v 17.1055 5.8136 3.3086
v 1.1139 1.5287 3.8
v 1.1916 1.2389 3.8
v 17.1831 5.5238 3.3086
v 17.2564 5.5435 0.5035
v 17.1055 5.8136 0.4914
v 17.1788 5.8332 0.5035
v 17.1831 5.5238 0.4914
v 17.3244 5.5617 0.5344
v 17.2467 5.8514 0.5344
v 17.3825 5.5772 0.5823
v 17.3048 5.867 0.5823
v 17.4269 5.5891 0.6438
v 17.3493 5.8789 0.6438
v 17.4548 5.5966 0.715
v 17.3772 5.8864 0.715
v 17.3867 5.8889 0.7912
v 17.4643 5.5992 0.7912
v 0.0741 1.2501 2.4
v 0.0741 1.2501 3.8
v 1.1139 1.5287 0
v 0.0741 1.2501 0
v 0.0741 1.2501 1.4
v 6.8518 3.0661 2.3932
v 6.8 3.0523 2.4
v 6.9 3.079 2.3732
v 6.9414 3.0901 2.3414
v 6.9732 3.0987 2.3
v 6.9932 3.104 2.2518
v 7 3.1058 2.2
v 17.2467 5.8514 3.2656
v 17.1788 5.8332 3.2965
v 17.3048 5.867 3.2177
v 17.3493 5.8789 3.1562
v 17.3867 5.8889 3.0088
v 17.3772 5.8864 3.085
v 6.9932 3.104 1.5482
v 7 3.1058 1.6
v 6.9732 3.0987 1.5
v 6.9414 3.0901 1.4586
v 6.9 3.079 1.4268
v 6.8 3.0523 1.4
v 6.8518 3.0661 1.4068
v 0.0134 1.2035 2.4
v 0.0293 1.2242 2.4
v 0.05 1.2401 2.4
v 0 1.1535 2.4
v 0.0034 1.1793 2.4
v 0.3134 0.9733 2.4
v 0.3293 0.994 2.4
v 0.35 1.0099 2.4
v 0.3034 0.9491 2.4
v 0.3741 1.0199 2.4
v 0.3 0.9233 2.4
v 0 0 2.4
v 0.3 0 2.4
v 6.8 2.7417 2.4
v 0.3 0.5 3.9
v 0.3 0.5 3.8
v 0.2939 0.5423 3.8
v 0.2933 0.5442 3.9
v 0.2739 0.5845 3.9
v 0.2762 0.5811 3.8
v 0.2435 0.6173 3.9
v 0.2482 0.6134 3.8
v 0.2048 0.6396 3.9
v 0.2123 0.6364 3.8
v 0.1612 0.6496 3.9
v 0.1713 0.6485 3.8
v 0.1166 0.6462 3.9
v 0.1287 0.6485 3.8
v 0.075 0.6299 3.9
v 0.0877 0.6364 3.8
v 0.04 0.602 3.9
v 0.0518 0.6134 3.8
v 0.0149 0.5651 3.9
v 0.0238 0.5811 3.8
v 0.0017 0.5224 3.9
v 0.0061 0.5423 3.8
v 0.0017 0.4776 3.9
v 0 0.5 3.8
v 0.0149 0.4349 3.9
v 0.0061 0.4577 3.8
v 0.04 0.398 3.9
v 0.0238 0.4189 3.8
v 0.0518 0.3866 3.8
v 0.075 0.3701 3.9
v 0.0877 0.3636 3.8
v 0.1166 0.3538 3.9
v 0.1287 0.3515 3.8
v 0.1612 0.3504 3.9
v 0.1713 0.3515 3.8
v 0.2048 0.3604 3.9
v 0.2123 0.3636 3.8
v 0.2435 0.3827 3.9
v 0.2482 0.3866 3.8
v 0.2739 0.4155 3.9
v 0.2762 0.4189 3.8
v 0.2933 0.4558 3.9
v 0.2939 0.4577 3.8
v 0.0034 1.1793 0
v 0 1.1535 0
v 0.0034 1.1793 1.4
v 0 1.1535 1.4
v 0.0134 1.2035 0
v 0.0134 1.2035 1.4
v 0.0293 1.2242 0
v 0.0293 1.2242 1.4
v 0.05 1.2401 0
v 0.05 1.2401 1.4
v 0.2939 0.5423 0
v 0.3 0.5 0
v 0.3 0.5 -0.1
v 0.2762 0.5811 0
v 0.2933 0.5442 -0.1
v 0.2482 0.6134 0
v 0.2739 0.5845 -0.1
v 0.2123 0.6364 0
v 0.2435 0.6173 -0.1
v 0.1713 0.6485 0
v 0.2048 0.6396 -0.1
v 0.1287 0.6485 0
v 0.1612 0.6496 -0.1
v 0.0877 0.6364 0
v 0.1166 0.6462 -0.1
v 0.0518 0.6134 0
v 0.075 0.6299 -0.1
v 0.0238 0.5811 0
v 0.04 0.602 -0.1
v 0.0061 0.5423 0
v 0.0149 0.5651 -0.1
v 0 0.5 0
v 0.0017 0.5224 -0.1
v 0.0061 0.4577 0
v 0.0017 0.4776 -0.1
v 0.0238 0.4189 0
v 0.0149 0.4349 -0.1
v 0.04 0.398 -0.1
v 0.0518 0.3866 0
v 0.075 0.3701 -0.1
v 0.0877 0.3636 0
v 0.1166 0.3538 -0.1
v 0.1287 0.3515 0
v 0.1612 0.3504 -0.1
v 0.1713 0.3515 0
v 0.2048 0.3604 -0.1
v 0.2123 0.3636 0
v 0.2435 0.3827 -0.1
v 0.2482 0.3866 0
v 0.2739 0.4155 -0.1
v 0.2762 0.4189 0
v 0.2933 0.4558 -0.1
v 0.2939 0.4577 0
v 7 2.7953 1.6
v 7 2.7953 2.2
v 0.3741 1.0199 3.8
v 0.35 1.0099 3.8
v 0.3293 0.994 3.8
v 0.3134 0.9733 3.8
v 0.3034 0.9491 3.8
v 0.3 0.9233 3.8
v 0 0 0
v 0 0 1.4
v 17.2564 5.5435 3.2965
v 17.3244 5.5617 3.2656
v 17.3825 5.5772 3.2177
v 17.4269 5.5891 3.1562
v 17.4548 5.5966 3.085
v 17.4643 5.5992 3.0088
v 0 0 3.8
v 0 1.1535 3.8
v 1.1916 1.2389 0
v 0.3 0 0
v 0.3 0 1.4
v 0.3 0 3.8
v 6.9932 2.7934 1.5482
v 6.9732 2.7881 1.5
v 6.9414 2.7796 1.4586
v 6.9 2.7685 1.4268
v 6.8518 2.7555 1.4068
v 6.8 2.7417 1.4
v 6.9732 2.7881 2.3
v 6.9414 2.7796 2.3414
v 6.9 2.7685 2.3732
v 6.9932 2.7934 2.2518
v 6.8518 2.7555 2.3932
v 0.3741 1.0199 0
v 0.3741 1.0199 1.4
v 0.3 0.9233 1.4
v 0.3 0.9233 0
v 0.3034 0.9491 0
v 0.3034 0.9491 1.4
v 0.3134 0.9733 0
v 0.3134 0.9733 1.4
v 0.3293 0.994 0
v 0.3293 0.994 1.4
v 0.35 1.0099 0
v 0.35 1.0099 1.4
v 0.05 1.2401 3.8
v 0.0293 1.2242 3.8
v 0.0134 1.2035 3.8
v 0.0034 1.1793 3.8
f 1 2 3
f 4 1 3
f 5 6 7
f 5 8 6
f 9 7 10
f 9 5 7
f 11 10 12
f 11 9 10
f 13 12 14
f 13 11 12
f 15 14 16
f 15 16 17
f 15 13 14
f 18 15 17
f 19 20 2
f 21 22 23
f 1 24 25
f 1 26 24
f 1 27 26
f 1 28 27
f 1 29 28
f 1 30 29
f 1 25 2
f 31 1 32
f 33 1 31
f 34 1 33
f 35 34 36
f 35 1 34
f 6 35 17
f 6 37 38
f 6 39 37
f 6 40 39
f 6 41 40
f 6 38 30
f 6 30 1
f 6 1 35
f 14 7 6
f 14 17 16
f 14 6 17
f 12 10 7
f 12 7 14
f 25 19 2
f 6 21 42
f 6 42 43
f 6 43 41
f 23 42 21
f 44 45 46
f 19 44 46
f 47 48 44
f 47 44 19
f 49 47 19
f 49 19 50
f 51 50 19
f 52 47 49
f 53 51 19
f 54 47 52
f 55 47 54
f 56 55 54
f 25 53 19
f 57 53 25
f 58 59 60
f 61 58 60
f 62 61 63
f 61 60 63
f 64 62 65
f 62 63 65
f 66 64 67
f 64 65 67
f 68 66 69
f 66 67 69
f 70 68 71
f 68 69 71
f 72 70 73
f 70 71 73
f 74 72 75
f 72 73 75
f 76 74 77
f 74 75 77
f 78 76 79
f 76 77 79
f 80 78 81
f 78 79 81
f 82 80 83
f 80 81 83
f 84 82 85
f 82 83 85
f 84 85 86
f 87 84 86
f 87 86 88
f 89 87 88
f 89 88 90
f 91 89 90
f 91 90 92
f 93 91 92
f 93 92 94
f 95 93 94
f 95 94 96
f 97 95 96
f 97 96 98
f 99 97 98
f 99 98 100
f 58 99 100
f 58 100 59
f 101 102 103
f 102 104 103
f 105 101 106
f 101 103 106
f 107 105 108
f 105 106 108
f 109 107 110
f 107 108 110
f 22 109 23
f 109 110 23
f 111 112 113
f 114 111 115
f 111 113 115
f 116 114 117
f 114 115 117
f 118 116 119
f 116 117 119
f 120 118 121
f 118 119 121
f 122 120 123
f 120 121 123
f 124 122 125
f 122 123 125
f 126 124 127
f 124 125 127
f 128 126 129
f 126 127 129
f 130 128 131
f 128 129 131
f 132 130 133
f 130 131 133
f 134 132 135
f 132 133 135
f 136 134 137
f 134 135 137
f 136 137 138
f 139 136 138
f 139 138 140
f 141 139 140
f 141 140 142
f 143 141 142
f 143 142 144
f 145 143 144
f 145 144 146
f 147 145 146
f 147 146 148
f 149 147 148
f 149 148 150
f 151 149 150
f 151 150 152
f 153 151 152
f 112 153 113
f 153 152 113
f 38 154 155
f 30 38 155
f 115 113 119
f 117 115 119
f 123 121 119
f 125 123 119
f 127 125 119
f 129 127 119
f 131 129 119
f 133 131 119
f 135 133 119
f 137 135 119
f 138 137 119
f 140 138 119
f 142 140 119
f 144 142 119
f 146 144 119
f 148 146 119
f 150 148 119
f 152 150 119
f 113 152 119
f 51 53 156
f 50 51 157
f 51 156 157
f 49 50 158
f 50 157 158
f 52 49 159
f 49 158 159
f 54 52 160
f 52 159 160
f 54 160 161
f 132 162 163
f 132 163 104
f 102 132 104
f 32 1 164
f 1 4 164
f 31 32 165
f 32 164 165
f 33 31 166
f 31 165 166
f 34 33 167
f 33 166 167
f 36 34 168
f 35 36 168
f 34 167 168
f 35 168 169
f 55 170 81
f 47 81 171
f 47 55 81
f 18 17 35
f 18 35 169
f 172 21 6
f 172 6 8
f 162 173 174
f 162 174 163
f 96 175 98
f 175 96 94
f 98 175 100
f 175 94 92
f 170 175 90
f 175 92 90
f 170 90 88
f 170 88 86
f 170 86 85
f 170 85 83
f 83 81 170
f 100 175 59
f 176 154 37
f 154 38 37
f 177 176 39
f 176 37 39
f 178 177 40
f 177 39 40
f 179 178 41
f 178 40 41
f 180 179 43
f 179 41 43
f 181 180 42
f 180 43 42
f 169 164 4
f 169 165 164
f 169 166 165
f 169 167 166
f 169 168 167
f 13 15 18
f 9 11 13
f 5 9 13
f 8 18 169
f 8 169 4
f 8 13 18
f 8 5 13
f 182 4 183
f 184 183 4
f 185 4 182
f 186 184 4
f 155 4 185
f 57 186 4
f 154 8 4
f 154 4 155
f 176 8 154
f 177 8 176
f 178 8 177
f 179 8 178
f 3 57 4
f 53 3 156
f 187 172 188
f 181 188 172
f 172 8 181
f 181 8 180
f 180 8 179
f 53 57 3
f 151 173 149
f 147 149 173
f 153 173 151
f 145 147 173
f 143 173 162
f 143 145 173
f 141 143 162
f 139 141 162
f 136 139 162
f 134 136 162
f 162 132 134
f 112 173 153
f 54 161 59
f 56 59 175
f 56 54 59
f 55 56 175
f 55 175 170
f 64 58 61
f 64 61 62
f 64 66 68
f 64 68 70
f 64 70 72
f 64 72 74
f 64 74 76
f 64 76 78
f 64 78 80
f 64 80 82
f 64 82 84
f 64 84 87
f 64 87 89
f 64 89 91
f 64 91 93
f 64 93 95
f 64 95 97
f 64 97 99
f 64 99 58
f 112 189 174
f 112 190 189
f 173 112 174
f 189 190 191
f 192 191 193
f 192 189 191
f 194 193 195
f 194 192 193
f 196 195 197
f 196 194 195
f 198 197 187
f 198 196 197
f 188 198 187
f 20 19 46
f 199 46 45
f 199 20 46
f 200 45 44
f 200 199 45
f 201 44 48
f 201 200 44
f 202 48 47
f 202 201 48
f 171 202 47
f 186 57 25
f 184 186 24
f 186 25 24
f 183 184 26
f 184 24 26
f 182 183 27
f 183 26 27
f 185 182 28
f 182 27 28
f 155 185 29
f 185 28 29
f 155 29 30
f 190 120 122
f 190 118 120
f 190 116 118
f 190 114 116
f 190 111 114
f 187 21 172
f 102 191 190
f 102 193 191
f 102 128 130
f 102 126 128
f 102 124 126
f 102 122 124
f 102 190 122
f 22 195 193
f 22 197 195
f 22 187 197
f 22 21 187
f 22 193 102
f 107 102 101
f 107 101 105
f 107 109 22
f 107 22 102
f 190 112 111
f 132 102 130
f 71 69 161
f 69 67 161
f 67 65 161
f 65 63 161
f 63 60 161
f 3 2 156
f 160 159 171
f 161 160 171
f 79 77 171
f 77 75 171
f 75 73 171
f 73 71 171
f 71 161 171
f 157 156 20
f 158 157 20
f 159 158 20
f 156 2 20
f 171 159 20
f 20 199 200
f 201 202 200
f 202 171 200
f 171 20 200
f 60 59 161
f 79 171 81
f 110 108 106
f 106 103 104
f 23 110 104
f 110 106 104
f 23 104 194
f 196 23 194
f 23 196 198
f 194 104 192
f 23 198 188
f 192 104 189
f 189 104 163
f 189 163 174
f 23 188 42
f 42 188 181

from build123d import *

# Parameters (mm, degrees)
BOSS_EXTRUDE1_DEPTH      = 3.8
CHAMFER1_SIZE            = 0.5
CHAMFER1_SIZE2           = 16.846754467
BOSS_EXTRUDE2_DEPTH      = 0.1
BOSS_EXTRUDE2_DEPTH_BACK = 3.9
SKETCH3_R                = 0.15
SKETCH4_W                = 7
SKETCH4_H                = 1
CUT_EXTRUDE2_DEPTH       = 10
FILLET1_R                = 0.1
FILLET2_R                = 0.3
FILLET3_R                = 0.2


with BuildPart() as part:
    # Sketch1 → Boss-Extrude1 (new body)
    with BuildSketch(Plane.XY):
        Polygon((0, 0), (0, 1.230198096), (17.386664873, 5.888940908), (17.464310587, 5.59916316), (0.3, 1), (0.3, 0), align=None)
    extrude(amount=BOSS_EXTRUDE1_DEPTH)

    # Chamfer1
    chamfer1_edges = [part.edges().sort_by_distance(p)[0] for p in [
        (17.42548773, 5.744052034, 3.8),
        (17.42548773, 5.744052034, 0),
    ]]
    chamfer1_side = [part.faces().sort_by_distance(p)[0] for p in [
        (17.42548773, 5.744052034, 1.9),
    ]]
    chamfer(chamfer1_edges, length=CHAMFER1_SIZE, length2=CHAMFER1_SIZE2, reference=chamfer1_side[0])

    # Sketch3 → Boss-Extrude2 (add, two sides: drawn at the far end of the back side and taken through both)
    with BuildSketch(Plane.XY.offset(3.8).offset(-BOSS_EXTRUDE2_DEPTH_BACK)):
        with Locations((0.15, 0.5)):
            Circle(SKETCH3_R)
    extrude(amount=BOSS_EXTRUDE2_DEPTH + BOSS_EXTRUDE2_DEPTH_BACK)

    # Sketch4 → Cut-Extrude2 (cut)
    with BuildSketch(Plane.XZ):
        with Locations((3.5, 1.9)):
            Rectangle(SKETCH4_W, SKETCH4_H)
    extrude(amount=-CUT_EXTRUDE2_DEPTH, mode=Mode.SUBTRACT)

    # Fillet1
    fillet1_edges = [part.edges().sort_by_distance(p)[0] for p in [
        (0, 1.230198096, 3.1),
        (0.3, 1, 3.1),
        (0, 1.230198096, 0.7),
        (0.3, 1, 0.7),
    ]]
    fillet(fillet1_edges, radius=FILLET1_R)

    # Fillet2
    fillet2_edges = [part.edges().sort_by_distance(p)[0] for p in [
        (17.42548773, 5.744052034, 0.5),
        (17.42548773, 5.744052034, 3.3),
    ]]
    fillet(fillet2_edges, radius=FILLET2_R)

    # Fillet3
    fillet3_edges = [part.edges().sort_by_distance(p)[0] for p in [
        (7, 2.950551016, 2.4),
        (7, 2.950551016, 1.4),
    ]]
    fillet(fillet3_edges, radius=FILLET3_R)


solid = part.part
